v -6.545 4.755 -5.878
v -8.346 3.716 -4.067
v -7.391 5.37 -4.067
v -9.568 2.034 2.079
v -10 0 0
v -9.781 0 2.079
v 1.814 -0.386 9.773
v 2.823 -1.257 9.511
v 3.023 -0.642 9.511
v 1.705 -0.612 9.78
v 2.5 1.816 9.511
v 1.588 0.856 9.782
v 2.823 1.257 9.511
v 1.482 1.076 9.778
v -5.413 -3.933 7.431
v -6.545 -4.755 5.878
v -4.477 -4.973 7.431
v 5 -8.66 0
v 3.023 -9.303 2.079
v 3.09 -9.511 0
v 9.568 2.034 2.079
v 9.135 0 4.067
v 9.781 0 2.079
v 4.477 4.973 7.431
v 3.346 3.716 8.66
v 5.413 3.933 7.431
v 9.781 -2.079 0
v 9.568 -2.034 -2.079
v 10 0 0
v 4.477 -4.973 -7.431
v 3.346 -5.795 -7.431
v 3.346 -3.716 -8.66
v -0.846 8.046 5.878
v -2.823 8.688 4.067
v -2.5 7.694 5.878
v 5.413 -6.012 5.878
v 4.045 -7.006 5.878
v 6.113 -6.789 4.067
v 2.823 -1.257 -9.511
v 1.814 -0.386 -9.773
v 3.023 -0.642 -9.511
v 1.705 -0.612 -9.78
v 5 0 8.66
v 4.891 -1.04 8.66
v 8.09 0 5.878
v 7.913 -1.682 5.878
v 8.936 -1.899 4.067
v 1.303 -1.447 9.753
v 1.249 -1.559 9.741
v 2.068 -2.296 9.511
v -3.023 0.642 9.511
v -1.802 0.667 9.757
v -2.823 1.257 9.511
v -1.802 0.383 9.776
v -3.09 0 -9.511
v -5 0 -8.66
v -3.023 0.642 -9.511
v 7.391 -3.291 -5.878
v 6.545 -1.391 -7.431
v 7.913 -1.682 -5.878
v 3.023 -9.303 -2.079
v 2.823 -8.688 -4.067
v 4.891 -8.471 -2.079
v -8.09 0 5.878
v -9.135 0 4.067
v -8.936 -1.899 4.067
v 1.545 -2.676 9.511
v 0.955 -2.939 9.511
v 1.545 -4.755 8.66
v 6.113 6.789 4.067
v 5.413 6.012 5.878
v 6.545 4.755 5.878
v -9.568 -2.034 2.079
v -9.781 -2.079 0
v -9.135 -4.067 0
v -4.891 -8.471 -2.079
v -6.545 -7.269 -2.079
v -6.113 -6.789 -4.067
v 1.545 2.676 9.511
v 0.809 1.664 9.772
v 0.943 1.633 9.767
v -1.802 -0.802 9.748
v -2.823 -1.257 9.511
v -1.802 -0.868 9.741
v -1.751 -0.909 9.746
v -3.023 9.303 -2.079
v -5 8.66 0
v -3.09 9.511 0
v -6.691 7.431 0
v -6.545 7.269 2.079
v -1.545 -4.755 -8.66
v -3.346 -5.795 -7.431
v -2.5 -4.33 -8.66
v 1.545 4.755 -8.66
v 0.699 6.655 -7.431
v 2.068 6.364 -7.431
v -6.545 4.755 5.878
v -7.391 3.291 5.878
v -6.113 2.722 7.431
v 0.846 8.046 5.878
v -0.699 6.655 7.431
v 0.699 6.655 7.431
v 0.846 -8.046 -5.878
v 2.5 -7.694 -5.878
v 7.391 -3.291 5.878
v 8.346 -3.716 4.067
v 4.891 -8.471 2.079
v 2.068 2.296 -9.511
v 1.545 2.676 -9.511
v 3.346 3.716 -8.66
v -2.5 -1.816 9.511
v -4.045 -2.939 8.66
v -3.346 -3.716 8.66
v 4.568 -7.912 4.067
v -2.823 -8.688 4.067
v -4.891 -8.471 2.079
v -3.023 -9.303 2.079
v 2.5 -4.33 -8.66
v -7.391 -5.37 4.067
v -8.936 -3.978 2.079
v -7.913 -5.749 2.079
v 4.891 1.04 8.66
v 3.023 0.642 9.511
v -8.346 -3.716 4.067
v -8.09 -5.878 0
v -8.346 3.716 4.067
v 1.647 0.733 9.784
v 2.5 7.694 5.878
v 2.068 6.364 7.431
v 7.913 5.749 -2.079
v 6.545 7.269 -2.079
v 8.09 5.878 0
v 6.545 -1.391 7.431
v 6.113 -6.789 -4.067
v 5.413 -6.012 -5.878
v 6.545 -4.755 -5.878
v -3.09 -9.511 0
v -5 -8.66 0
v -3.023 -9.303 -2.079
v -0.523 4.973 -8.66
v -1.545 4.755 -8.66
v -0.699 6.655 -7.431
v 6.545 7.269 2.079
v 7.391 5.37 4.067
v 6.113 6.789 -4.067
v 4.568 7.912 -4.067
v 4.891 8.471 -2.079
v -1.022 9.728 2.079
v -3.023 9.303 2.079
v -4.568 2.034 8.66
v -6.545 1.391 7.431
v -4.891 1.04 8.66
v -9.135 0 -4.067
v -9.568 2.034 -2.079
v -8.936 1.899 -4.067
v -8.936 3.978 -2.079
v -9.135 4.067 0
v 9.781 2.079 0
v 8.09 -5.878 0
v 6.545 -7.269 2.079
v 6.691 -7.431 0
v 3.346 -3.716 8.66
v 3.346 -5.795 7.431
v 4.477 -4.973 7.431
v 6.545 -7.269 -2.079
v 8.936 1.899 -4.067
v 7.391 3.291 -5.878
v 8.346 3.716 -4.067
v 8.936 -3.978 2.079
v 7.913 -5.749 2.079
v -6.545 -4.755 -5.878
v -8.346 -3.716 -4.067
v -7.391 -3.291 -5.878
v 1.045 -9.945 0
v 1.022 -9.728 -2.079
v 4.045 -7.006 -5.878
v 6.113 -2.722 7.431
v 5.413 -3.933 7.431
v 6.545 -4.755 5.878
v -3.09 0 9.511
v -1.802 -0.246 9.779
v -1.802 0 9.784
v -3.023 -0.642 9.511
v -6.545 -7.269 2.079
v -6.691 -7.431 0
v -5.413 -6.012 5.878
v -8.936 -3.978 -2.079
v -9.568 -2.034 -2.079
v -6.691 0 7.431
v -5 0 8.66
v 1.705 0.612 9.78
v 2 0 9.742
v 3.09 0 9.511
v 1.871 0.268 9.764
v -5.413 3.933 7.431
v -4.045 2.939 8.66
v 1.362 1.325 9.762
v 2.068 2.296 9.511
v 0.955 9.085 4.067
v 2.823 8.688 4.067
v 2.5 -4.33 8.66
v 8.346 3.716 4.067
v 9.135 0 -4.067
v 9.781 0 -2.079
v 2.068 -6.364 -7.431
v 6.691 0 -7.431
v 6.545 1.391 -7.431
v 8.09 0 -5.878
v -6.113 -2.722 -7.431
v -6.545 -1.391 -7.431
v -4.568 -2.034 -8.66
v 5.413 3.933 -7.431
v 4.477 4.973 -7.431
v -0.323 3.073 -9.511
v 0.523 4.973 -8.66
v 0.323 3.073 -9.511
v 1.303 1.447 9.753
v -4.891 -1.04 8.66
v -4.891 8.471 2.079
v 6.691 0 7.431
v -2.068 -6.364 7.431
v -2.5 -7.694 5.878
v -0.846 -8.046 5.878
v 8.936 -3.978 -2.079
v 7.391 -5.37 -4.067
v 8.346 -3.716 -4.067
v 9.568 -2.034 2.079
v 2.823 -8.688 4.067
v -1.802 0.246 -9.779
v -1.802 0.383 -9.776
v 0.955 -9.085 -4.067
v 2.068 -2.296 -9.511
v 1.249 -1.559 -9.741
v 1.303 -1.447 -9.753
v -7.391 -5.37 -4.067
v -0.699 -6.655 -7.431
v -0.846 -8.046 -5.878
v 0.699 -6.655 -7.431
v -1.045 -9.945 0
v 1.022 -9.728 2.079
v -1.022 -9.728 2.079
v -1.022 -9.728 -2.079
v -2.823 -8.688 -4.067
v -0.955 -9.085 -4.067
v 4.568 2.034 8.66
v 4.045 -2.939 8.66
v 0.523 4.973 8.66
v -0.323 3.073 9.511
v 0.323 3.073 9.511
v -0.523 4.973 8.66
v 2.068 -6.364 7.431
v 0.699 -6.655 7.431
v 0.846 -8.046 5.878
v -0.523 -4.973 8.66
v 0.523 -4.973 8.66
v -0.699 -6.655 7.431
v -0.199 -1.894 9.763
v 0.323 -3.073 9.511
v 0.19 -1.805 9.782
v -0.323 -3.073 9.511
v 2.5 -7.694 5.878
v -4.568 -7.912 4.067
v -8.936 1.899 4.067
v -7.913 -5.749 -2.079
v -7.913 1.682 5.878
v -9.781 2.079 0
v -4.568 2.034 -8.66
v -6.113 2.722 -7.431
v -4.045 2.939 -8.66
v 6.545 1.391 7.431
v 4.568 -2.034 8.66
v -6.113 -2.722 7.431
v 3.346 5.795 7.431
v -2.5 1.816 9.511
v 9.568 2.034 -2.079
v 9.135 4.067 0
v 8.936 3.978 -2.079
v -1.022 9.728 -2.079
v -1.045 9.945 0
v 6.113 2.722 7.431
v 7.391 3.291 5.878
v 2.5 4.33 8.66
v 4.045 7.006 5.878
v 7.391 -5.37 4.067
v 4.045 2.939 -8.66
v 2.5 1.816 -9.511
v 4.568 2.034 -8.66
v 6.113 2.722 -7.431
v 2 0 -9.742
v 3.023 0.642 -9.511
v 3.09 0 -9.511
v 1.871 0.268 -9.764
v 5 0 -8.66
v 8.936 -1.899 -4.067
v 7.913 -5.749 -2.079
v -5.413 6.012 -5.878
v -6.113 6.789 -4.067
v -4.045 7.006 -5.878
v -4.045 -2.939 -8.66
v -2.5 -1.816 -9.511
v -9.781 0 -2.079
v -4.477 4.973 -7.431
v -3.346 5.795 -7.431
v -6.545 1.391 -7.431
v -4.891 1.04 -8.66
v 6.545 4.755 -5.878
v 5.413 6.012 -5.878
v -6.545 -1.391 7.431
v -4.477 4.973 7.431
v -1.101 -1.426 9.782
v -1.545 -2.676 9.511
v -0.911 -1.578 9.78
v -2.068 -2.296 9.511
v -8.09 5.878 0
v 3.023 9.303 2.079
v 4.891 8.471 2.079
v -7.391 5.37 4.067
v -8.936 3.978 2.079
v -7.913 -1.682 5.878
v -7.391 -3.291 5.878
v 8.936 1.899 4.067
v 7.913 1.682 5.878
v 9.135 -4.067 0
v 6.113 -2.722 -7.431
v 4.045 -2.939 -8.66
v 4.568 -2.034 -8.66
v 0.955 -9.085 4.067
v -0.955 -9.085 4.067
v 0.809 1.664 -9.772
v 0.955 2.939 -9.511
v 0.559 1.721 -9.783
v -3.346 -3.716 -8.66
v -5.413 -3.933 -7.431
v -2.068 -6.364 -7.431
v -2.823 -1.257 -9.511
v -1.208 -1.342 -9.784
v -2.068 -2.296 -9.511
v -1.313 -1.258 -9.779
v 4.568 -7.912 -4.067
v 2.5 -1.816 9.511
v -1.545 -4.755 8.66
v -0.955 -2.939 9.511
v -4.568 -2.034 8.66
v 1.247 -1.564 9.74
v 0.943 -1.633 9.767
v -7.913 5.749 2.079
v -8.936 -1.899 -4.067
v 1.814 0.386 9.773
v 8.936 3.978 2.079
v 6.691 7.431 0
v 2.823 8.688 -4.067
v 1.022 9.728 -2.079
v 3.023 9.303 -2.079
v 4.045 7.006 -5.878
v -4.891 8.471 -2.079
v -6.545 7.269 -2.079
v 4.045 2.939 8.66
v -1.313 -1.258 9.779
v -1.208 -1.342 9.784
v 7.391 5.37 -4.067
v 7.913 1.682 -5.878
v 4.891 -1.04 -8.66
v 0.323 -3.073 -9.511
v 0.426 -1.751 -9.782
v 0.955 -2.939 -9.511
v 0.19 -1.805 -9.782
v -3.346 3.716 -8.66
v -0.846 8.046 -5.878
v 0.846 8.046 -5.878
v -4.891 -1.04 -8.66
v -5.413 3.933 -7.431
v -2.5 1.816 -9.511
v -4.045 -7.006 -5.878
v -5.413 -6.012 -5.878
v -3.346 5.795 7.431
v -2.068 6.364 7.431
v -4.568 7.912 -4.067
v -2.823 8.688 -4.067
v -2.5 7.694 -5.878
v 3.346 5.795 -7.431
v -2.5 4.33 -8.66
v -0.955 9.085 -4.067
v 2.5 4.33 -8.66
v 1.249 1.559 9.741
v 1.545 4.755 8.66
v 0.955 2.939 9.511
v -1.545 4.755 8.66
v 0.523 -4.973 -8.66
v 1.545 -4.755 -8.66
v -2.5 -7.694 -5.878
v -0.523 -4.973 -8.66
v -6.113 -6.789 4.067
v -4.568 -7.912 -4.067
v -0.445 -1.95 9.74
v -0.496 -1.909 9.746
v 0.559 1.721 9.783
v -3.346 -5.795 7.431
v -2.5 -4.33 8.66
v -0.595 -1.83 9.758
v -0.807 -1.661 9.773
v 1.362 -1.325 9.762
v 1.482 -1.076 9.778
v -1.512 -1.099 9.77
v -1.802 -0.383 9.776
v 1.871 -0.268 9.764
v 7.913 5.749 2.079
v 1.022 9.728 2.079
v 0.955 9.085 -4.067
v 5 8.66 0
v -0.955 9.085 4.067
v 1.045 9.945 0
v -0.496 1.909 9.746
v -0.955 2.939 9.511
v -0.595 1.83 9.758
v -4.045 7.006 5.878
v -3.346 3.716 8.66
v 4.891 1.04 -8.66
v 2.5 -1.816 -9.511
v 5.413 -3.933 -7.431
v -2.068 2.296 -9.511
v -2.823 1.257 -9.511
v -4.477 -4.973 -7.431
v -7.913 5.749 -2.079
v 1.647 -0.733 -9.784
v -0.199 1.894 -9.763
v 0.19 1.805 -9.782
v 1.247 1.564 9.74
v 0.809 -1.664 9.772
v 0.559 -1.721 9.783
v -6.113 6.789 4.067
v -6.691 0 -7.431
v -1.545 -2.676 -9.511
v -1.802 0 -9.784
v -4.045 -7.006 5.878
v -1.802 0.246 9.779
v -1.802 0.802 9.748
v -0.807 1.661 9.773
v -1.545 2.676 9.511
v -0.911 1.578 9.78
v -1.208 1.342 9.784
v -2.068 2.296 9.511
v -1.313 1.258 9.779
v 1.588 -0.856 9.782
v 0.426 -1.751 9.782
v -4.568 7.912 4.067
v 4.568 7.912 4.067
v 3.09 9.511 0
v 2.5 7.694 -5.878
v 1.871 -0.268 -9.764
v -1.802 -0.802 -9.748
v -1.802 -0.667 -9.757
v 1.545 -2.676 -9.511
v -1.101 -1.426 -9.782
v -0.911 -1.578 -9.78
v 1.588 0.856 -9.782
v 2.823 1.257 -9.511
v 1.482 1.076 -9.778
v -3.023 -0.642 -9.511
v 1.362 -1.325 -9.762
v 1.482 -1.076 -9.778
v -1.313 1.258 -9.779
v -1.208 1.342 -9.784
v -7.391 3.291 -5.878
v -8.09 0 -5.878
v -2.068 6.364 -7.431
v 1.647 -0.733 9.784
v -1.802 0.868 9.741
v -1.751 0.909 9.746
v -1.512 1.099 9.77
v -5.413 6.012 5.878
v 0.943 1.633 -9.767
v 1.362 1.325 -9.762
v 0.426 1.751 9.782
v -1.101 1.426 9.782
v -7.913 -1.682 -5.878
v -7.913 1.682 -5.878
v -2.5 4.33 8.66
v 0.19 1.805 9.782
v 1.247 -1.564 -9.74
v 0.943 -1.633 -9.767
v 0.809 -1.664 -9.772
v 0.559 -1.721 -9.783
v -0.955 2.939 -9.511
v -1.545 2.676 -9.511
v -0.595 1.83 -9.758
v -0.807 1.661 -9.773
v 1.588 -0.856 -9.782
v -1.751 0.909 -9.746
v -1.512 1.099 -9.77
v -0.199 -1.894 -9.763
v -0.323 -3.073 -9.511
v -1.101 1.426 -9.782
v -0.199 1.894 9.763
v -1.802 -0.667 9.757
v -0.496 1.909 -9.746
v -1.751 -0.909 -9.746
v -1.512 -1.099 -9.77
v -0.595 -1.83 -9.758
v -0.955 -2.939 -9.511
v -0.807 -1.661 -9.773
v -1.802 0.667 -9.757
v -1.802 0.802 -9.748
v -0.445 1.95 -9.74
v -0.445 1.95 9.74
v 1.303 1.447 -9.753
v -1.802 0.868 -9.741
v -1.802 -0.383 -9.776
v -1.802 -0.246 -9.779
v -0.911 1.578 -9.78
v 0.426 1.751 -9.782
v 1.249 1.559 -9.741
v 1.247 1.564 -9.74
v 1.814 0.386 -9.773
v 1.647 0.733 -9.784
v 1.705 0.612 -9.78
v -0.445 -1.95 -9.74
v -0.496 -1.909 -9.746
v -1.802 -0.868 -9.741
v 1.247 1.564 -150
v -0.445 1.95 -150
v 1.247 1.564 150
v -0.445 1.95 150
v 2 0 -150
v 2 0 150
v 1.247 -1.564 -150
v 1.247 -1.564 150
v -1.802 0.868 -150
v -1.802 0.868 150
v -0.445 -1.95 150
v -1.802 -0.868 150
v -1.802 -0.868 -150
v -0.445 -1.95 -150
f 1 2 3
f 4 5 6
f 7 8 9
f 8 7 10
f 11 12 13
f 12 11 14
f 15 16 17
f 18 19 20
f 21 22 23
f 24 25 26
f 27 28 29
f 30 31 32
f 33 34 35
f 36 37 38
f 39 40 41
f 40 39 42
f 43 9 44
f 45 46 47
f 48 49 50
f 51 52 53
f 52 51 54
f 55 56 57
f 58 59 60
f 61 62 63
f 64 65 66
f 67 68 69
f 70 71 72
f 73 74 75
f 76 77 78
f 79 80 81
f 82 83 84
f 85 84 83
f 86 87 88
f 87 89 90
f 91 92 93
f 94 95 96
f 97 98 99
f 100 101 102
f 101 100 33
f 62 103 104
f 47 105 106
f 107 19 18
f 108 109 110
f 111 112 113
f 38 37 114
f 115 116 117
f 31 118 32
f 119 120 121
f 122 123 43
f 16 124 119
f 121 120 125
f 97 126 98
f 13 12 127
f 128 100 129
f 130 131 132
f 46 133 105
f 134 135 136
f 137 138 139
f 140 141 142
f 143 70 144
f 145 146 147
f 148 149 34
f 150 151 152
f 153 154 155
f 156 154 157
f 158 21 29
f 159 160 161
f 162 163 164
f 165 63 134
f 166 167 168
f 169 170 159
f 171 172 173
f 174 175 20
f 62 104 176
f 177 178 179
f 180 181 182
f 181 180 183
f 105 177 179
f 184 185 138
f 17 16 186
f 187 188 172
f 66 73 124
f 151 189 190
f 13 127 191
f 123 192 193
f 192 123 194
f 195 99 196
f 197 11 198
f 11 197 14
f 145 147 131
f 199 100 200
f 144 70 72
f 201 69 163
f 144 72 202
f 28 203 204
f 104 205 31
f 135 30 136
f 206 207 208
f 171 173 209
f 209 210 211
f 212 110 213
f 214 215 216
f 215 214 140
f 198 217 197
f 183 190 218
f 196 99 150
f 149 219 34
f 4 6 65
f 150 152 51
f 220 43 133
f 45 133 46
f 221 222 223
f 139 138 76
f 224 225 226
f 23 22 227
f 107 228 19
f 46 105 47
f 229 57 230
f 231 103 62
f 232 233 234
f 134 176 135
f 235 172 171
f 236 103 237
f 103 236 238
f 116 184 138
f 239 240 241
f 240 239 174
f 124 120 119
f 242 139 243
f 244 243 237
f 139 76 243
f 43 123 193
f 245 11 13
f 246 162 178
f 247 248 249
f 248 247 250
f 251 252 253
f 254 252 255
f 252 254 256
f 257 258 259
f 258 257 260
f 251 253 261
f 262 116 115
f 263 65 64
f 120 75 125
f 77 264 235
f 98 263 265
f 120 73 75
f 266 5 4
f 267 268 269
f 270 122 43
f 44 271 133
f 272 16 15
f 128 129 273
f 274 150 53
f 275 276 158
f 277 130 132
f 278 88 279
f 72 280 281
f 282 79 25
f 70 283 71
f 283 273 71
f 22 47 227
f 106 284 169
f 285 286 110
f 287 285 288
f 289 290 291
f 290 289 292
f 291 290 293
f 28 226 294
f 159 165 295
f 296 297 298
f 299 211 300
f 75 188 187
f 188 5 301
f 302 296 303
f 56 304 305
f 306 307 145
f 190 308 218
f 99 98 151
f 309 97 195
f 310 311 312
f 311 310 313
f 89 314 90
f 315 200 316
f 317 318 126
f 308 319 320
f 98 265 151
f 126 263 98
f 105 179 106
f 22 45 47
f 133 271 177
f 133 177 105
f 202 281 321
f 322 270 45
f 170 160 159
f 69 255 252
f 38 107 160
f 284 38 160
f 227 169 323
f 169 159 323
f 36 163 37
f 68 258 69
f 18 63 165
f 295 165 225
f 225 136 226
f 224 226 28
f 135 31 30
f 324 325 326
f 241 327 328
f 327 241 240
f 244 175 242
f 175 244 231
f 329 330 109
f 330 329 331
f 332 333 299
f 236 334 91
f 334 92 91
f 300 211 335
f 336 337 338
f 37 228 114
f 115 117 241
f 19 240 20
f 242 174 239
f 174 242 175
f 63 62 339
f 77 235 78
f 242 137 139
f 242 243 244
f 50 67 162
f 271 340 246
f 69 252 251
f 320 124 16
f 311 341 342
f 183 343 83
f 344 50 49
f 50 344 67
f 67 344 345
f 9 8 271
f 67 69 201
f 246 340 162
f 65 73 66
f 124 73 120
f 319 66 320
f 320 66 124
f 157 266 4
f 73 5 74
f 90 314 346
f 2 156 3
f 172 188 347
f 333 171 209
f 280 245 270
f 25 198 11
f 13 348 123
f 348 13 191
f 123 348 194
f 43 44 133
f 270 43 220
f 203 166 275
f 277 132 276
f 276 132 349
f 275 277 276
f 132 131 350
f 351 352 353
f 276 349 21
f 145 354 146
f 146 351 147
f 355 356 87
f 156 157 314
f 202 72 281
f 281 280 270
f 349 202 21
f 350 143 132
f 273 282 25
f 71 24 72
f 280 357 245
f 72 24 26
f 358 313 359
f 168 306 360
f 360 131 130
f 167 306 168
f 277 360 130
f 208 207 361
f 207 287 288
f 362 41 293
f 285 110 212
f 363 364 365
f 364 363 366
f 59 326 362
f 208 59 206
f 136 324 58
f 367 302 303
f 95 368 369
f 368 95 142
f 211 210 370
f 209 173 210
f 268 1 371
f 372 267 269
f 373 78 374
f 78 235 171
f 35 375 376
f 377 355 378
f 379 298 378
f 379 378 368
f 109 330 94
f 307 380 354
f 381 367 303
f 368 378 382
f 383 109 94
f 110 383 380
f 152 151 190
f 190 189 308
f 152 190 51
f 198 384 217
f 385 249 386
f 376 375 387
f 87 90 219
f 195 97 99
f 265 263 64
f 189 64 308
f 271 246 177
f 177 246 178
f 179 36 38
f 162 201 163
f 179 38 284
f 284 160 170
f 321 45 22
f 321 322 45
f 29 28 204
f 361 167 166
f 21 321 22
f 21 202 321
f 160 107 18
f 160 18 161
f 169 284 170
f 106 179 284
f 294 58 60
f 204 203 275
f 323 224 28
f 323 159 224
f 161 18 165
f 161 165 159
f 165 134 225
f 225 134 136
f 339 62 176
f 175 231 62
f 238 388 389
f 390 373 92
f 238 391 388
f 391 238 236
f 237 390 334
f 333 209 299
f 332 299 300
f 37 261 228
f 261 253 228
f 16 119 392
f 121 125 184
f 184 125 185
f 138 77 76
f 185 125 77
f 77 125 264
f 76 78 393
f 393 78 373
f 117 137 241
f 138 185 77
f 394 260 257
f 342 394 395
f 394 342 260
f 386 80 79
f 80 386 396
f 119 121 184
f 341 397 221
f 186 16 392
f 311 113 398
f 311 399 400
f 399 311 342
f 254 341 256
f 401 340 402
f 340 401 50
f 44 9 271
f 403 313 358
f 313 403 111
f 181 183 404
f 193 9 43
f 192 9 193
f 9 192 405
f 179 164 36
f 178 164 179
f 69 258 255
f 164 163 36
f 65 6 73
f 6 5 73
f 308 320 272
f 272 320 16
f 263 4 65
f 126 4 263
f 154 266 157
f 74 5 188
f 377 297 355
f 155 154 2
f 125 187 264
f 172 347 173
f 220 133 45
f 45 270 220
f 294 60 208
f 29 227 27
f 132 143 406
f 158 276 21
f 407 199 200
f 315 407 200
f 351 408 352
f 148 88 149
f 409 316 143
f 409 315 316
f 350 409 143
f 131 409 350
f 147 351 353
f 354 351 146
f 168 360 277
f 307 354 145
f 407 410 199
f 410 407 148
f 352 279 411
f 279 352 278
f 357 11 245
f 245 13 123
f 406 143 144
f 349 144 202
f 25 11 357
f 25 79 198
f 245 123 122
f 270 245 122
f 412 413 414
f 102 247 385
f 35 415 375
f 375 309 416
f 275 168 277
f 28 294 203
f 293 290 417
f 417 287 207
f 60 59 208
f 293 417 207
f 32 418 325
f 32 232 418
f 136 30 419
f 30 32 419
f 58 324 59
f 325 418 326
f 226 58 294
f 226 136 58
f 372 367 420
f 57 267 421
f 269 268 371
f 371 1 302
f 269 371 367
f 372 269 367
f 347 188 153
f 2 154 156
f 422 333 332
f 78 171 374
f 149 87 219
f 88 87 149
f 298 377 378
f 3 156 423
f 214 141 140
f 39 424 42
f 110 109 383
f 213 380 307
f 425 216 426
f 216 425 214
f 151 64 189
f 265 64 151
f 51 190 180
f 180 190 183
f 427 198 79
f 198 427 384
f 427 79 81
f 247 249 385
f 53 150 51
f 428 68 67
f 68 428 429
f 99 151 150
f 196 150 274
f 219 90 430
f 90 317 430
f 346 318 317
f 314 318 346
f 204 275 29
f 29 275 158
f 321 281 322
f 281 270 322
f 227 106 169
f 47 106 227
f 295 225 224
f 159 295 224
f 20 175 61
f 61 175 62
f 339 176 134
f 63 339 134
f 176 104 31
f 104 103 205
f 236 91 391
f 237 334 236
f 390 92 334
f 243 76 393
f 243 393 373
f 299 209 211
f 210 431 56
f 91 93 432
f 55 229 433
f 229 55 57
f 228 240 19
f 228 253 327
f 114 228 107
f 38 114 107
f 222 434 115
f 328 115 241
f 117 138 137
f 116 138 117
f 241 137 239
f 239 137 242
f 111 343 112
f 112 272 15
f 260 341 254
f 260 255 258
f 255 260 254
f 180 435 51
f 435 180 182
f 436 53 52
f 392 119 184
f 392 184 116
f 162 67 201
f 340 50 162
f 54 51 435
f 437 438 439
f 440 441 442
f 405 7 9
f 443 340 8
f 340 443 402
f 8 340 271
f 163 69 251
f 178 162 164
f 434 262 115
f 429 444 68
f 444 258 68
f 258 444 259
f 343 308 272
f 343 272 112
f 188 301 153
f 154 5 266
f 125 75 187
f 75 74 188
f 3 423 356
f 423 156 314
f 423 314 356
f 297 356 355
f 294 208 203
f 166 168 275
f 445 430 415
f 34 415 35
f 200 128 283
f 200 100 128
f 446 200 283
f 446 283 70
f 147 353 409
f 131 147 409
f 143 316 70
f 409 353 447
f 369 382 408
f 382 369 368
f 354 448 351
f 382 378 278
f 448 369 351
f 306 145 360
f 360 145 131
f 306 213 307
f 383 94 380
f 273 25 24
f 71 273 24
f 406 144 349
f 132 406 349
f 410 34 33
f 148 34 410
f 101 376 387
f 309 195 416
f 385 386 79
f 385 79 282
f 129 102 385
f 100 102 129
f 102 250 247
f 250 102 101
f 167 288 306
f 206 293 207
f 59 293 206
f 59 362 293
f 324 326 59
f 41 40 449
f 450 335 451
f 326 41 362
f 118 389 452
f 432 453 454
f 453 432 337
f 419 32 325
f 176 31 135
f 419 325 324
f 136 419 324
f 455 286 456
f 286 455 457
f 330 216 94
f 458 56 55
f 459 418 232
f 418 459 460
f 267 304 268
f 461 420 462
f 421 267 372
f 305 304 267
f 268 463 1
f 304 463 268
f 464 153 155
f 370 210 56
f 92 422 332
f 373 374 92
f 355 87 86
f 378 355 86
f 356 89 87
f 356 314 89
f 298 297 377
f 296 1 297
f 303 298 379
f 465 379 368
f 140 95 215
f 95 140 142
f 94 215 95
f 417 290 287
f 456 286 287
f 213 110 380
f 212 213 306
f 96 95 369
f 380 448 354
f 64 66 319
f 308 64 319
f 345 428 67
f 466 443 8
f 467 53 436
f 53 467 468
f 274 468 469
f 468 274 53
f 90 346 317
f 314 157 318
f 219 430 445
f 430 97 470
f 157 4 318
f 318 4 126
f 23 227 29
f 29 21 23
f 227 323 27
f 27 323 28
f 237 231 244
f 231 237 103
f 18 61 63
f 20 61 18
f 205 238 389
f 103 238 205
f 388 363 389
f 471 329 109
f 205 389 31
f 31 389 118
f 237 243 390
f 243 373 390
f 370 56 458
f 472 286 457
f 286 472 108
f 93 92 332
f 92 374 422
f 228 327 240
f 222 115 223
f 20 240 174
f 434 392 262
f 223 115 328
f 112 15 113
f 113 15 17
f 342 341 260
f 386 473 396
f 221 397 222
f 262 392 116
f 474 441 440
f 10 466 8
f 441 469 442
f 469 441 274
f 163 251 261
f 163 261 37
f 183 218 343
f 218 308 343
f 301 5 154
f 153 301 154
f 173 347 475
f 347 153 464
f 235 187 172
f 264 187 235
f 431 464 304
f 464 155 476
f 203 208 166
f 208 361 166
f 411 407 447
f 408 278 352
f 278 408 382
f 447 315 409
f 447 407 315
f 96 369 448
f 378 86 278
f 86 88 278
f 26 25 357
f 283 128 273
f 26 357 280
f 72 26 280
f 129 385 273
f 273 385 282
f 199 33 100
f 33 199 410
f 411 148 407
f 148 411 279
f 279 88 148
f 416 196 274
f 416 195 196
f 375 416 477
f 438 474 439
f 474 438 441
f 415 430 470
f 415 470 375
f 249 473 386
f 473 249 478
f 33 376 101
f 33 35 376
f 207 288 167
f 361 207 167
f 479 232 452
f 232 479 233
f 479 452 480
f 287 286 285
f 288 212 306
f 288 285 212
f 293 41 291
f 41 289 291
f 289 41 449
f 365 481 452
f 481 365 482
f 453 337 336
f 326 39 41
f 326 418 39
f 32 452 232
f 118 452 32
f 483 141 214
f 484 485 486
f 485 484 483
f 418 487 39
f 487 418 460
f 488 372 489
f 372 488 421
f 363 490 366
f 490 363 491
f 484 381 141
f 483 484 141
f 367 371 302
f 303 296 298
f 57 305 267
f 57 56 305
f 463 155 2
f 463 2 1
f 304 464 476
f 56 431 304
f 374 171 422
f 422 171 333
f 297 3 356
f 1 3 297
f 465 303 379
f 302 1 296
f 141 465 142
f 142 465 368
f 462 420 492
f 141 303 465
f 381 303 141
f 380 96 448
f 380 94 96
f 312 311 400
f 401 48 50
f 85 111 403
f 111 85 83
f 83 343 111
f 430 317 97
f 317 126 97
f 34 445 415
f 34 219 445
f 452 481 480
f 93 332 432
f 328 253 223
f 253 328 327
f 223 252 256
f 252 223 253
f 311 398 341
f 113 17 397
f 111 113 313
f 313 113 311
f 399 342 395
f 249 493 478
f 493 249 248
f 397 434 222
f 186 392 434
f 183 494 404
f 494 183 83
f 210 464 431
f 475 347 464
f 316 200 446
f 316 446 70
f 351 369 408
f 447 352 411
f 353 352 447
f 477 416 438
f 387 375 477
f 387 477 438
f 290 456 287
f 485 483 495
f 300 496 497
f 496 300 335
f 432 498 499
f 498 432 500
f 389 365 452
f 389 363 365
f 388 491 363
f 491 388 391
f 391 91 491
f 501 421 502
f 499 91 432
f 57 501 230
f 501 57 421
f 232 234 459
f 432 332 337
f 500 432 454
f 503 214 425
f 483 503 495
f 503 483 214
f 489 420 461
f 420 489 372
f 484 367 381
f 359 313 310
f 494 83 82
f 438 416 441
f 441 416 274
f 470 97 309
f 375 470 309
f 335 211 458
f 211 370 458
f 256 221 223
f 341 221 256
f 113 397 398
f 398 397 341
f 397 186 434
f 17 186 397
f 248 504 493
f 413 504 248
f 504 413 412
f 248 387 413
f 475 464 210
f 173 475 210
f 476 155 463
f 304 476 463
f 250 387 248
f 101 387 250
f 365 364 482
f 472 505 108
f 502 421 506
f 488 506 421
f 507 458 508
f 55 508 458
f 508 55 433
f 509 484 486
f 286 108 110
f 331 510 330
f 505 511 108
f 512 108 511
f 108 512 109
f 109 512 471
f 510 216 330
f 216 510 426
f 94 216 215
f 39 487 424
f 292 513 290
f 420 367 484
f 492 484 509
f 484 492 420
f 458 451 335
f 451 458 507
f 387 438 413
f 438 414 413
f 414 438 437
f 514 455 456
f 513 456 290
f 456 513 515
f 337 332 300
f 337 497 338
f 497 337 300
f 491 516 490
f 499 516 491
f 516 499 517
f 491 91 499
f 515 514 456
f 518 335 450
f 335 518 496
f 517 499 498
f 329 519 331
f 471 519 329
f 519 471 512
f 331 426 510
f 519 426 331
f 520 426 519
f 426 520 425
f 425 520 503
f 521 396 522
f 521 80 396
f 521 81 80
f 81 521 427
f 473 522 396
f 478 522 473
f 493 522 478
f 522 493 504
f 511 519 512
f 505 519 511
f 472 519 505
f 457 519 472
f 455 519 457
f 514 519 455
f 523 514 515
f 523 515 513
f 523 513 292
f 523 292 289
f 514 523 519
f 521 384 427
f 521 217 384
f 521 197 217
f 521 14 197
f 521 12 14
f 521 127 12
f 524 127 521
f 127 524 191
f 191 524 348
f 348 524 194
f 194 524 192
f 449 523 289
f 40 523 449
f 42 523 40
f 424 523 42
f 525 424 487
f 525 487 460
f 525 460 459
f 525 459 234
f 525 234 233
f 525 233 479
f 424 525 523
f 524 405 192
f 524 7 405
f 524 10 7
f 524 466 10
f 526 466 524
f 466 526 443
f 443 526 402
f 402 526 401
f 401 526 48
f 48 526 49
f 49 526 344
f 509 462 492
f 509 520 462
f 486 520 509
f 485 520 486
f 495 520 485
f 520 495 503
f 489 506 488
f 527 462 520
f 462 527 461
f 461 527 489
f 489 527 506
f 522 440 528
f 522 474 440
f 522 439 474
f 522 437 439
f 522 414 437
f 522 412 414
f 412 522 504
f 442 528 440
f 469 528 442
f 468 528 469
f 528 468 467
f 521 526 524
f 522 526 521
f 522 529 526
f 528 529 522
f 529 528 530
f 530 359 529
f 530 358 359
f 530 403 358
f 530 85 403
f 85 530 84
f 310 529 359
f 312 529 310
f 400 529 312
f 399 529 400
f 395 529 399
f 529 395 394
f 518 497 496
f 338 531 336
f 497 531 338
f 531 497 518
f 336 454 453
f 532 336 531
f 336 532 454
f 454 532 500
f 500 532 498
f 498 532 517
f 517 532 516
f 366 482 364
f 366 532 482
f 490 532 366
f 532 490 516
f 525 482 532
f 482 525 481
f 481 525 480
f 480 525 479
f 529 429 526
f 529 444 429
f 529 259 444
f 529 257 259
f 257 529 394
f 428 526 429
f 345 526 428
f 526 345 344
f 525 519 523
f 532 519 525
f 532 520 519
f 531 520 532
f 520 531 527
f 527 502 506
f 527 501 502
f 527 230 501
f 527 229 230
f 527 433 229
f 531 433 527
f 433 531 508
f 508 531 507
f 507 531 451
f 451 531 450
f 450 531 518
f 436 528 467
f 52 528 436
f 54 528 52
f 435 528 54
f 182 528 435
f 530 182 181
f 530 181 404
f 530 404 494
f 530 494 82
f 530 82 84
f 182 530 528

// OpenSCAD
// This indicates the in-line
// joint-primitive constraint. 
// 
// Here we have a case point on 
// the red component must be found
// on a line in the green component.

color("red", 0.5){
translate([0,0,0])
  rotate([0,0,0])
    sphere(10);
}

color("green", 0.5){
translate([0,0,0])
  rotate([0,0,0])
    cylinder(300, 2, 2, true);
}
